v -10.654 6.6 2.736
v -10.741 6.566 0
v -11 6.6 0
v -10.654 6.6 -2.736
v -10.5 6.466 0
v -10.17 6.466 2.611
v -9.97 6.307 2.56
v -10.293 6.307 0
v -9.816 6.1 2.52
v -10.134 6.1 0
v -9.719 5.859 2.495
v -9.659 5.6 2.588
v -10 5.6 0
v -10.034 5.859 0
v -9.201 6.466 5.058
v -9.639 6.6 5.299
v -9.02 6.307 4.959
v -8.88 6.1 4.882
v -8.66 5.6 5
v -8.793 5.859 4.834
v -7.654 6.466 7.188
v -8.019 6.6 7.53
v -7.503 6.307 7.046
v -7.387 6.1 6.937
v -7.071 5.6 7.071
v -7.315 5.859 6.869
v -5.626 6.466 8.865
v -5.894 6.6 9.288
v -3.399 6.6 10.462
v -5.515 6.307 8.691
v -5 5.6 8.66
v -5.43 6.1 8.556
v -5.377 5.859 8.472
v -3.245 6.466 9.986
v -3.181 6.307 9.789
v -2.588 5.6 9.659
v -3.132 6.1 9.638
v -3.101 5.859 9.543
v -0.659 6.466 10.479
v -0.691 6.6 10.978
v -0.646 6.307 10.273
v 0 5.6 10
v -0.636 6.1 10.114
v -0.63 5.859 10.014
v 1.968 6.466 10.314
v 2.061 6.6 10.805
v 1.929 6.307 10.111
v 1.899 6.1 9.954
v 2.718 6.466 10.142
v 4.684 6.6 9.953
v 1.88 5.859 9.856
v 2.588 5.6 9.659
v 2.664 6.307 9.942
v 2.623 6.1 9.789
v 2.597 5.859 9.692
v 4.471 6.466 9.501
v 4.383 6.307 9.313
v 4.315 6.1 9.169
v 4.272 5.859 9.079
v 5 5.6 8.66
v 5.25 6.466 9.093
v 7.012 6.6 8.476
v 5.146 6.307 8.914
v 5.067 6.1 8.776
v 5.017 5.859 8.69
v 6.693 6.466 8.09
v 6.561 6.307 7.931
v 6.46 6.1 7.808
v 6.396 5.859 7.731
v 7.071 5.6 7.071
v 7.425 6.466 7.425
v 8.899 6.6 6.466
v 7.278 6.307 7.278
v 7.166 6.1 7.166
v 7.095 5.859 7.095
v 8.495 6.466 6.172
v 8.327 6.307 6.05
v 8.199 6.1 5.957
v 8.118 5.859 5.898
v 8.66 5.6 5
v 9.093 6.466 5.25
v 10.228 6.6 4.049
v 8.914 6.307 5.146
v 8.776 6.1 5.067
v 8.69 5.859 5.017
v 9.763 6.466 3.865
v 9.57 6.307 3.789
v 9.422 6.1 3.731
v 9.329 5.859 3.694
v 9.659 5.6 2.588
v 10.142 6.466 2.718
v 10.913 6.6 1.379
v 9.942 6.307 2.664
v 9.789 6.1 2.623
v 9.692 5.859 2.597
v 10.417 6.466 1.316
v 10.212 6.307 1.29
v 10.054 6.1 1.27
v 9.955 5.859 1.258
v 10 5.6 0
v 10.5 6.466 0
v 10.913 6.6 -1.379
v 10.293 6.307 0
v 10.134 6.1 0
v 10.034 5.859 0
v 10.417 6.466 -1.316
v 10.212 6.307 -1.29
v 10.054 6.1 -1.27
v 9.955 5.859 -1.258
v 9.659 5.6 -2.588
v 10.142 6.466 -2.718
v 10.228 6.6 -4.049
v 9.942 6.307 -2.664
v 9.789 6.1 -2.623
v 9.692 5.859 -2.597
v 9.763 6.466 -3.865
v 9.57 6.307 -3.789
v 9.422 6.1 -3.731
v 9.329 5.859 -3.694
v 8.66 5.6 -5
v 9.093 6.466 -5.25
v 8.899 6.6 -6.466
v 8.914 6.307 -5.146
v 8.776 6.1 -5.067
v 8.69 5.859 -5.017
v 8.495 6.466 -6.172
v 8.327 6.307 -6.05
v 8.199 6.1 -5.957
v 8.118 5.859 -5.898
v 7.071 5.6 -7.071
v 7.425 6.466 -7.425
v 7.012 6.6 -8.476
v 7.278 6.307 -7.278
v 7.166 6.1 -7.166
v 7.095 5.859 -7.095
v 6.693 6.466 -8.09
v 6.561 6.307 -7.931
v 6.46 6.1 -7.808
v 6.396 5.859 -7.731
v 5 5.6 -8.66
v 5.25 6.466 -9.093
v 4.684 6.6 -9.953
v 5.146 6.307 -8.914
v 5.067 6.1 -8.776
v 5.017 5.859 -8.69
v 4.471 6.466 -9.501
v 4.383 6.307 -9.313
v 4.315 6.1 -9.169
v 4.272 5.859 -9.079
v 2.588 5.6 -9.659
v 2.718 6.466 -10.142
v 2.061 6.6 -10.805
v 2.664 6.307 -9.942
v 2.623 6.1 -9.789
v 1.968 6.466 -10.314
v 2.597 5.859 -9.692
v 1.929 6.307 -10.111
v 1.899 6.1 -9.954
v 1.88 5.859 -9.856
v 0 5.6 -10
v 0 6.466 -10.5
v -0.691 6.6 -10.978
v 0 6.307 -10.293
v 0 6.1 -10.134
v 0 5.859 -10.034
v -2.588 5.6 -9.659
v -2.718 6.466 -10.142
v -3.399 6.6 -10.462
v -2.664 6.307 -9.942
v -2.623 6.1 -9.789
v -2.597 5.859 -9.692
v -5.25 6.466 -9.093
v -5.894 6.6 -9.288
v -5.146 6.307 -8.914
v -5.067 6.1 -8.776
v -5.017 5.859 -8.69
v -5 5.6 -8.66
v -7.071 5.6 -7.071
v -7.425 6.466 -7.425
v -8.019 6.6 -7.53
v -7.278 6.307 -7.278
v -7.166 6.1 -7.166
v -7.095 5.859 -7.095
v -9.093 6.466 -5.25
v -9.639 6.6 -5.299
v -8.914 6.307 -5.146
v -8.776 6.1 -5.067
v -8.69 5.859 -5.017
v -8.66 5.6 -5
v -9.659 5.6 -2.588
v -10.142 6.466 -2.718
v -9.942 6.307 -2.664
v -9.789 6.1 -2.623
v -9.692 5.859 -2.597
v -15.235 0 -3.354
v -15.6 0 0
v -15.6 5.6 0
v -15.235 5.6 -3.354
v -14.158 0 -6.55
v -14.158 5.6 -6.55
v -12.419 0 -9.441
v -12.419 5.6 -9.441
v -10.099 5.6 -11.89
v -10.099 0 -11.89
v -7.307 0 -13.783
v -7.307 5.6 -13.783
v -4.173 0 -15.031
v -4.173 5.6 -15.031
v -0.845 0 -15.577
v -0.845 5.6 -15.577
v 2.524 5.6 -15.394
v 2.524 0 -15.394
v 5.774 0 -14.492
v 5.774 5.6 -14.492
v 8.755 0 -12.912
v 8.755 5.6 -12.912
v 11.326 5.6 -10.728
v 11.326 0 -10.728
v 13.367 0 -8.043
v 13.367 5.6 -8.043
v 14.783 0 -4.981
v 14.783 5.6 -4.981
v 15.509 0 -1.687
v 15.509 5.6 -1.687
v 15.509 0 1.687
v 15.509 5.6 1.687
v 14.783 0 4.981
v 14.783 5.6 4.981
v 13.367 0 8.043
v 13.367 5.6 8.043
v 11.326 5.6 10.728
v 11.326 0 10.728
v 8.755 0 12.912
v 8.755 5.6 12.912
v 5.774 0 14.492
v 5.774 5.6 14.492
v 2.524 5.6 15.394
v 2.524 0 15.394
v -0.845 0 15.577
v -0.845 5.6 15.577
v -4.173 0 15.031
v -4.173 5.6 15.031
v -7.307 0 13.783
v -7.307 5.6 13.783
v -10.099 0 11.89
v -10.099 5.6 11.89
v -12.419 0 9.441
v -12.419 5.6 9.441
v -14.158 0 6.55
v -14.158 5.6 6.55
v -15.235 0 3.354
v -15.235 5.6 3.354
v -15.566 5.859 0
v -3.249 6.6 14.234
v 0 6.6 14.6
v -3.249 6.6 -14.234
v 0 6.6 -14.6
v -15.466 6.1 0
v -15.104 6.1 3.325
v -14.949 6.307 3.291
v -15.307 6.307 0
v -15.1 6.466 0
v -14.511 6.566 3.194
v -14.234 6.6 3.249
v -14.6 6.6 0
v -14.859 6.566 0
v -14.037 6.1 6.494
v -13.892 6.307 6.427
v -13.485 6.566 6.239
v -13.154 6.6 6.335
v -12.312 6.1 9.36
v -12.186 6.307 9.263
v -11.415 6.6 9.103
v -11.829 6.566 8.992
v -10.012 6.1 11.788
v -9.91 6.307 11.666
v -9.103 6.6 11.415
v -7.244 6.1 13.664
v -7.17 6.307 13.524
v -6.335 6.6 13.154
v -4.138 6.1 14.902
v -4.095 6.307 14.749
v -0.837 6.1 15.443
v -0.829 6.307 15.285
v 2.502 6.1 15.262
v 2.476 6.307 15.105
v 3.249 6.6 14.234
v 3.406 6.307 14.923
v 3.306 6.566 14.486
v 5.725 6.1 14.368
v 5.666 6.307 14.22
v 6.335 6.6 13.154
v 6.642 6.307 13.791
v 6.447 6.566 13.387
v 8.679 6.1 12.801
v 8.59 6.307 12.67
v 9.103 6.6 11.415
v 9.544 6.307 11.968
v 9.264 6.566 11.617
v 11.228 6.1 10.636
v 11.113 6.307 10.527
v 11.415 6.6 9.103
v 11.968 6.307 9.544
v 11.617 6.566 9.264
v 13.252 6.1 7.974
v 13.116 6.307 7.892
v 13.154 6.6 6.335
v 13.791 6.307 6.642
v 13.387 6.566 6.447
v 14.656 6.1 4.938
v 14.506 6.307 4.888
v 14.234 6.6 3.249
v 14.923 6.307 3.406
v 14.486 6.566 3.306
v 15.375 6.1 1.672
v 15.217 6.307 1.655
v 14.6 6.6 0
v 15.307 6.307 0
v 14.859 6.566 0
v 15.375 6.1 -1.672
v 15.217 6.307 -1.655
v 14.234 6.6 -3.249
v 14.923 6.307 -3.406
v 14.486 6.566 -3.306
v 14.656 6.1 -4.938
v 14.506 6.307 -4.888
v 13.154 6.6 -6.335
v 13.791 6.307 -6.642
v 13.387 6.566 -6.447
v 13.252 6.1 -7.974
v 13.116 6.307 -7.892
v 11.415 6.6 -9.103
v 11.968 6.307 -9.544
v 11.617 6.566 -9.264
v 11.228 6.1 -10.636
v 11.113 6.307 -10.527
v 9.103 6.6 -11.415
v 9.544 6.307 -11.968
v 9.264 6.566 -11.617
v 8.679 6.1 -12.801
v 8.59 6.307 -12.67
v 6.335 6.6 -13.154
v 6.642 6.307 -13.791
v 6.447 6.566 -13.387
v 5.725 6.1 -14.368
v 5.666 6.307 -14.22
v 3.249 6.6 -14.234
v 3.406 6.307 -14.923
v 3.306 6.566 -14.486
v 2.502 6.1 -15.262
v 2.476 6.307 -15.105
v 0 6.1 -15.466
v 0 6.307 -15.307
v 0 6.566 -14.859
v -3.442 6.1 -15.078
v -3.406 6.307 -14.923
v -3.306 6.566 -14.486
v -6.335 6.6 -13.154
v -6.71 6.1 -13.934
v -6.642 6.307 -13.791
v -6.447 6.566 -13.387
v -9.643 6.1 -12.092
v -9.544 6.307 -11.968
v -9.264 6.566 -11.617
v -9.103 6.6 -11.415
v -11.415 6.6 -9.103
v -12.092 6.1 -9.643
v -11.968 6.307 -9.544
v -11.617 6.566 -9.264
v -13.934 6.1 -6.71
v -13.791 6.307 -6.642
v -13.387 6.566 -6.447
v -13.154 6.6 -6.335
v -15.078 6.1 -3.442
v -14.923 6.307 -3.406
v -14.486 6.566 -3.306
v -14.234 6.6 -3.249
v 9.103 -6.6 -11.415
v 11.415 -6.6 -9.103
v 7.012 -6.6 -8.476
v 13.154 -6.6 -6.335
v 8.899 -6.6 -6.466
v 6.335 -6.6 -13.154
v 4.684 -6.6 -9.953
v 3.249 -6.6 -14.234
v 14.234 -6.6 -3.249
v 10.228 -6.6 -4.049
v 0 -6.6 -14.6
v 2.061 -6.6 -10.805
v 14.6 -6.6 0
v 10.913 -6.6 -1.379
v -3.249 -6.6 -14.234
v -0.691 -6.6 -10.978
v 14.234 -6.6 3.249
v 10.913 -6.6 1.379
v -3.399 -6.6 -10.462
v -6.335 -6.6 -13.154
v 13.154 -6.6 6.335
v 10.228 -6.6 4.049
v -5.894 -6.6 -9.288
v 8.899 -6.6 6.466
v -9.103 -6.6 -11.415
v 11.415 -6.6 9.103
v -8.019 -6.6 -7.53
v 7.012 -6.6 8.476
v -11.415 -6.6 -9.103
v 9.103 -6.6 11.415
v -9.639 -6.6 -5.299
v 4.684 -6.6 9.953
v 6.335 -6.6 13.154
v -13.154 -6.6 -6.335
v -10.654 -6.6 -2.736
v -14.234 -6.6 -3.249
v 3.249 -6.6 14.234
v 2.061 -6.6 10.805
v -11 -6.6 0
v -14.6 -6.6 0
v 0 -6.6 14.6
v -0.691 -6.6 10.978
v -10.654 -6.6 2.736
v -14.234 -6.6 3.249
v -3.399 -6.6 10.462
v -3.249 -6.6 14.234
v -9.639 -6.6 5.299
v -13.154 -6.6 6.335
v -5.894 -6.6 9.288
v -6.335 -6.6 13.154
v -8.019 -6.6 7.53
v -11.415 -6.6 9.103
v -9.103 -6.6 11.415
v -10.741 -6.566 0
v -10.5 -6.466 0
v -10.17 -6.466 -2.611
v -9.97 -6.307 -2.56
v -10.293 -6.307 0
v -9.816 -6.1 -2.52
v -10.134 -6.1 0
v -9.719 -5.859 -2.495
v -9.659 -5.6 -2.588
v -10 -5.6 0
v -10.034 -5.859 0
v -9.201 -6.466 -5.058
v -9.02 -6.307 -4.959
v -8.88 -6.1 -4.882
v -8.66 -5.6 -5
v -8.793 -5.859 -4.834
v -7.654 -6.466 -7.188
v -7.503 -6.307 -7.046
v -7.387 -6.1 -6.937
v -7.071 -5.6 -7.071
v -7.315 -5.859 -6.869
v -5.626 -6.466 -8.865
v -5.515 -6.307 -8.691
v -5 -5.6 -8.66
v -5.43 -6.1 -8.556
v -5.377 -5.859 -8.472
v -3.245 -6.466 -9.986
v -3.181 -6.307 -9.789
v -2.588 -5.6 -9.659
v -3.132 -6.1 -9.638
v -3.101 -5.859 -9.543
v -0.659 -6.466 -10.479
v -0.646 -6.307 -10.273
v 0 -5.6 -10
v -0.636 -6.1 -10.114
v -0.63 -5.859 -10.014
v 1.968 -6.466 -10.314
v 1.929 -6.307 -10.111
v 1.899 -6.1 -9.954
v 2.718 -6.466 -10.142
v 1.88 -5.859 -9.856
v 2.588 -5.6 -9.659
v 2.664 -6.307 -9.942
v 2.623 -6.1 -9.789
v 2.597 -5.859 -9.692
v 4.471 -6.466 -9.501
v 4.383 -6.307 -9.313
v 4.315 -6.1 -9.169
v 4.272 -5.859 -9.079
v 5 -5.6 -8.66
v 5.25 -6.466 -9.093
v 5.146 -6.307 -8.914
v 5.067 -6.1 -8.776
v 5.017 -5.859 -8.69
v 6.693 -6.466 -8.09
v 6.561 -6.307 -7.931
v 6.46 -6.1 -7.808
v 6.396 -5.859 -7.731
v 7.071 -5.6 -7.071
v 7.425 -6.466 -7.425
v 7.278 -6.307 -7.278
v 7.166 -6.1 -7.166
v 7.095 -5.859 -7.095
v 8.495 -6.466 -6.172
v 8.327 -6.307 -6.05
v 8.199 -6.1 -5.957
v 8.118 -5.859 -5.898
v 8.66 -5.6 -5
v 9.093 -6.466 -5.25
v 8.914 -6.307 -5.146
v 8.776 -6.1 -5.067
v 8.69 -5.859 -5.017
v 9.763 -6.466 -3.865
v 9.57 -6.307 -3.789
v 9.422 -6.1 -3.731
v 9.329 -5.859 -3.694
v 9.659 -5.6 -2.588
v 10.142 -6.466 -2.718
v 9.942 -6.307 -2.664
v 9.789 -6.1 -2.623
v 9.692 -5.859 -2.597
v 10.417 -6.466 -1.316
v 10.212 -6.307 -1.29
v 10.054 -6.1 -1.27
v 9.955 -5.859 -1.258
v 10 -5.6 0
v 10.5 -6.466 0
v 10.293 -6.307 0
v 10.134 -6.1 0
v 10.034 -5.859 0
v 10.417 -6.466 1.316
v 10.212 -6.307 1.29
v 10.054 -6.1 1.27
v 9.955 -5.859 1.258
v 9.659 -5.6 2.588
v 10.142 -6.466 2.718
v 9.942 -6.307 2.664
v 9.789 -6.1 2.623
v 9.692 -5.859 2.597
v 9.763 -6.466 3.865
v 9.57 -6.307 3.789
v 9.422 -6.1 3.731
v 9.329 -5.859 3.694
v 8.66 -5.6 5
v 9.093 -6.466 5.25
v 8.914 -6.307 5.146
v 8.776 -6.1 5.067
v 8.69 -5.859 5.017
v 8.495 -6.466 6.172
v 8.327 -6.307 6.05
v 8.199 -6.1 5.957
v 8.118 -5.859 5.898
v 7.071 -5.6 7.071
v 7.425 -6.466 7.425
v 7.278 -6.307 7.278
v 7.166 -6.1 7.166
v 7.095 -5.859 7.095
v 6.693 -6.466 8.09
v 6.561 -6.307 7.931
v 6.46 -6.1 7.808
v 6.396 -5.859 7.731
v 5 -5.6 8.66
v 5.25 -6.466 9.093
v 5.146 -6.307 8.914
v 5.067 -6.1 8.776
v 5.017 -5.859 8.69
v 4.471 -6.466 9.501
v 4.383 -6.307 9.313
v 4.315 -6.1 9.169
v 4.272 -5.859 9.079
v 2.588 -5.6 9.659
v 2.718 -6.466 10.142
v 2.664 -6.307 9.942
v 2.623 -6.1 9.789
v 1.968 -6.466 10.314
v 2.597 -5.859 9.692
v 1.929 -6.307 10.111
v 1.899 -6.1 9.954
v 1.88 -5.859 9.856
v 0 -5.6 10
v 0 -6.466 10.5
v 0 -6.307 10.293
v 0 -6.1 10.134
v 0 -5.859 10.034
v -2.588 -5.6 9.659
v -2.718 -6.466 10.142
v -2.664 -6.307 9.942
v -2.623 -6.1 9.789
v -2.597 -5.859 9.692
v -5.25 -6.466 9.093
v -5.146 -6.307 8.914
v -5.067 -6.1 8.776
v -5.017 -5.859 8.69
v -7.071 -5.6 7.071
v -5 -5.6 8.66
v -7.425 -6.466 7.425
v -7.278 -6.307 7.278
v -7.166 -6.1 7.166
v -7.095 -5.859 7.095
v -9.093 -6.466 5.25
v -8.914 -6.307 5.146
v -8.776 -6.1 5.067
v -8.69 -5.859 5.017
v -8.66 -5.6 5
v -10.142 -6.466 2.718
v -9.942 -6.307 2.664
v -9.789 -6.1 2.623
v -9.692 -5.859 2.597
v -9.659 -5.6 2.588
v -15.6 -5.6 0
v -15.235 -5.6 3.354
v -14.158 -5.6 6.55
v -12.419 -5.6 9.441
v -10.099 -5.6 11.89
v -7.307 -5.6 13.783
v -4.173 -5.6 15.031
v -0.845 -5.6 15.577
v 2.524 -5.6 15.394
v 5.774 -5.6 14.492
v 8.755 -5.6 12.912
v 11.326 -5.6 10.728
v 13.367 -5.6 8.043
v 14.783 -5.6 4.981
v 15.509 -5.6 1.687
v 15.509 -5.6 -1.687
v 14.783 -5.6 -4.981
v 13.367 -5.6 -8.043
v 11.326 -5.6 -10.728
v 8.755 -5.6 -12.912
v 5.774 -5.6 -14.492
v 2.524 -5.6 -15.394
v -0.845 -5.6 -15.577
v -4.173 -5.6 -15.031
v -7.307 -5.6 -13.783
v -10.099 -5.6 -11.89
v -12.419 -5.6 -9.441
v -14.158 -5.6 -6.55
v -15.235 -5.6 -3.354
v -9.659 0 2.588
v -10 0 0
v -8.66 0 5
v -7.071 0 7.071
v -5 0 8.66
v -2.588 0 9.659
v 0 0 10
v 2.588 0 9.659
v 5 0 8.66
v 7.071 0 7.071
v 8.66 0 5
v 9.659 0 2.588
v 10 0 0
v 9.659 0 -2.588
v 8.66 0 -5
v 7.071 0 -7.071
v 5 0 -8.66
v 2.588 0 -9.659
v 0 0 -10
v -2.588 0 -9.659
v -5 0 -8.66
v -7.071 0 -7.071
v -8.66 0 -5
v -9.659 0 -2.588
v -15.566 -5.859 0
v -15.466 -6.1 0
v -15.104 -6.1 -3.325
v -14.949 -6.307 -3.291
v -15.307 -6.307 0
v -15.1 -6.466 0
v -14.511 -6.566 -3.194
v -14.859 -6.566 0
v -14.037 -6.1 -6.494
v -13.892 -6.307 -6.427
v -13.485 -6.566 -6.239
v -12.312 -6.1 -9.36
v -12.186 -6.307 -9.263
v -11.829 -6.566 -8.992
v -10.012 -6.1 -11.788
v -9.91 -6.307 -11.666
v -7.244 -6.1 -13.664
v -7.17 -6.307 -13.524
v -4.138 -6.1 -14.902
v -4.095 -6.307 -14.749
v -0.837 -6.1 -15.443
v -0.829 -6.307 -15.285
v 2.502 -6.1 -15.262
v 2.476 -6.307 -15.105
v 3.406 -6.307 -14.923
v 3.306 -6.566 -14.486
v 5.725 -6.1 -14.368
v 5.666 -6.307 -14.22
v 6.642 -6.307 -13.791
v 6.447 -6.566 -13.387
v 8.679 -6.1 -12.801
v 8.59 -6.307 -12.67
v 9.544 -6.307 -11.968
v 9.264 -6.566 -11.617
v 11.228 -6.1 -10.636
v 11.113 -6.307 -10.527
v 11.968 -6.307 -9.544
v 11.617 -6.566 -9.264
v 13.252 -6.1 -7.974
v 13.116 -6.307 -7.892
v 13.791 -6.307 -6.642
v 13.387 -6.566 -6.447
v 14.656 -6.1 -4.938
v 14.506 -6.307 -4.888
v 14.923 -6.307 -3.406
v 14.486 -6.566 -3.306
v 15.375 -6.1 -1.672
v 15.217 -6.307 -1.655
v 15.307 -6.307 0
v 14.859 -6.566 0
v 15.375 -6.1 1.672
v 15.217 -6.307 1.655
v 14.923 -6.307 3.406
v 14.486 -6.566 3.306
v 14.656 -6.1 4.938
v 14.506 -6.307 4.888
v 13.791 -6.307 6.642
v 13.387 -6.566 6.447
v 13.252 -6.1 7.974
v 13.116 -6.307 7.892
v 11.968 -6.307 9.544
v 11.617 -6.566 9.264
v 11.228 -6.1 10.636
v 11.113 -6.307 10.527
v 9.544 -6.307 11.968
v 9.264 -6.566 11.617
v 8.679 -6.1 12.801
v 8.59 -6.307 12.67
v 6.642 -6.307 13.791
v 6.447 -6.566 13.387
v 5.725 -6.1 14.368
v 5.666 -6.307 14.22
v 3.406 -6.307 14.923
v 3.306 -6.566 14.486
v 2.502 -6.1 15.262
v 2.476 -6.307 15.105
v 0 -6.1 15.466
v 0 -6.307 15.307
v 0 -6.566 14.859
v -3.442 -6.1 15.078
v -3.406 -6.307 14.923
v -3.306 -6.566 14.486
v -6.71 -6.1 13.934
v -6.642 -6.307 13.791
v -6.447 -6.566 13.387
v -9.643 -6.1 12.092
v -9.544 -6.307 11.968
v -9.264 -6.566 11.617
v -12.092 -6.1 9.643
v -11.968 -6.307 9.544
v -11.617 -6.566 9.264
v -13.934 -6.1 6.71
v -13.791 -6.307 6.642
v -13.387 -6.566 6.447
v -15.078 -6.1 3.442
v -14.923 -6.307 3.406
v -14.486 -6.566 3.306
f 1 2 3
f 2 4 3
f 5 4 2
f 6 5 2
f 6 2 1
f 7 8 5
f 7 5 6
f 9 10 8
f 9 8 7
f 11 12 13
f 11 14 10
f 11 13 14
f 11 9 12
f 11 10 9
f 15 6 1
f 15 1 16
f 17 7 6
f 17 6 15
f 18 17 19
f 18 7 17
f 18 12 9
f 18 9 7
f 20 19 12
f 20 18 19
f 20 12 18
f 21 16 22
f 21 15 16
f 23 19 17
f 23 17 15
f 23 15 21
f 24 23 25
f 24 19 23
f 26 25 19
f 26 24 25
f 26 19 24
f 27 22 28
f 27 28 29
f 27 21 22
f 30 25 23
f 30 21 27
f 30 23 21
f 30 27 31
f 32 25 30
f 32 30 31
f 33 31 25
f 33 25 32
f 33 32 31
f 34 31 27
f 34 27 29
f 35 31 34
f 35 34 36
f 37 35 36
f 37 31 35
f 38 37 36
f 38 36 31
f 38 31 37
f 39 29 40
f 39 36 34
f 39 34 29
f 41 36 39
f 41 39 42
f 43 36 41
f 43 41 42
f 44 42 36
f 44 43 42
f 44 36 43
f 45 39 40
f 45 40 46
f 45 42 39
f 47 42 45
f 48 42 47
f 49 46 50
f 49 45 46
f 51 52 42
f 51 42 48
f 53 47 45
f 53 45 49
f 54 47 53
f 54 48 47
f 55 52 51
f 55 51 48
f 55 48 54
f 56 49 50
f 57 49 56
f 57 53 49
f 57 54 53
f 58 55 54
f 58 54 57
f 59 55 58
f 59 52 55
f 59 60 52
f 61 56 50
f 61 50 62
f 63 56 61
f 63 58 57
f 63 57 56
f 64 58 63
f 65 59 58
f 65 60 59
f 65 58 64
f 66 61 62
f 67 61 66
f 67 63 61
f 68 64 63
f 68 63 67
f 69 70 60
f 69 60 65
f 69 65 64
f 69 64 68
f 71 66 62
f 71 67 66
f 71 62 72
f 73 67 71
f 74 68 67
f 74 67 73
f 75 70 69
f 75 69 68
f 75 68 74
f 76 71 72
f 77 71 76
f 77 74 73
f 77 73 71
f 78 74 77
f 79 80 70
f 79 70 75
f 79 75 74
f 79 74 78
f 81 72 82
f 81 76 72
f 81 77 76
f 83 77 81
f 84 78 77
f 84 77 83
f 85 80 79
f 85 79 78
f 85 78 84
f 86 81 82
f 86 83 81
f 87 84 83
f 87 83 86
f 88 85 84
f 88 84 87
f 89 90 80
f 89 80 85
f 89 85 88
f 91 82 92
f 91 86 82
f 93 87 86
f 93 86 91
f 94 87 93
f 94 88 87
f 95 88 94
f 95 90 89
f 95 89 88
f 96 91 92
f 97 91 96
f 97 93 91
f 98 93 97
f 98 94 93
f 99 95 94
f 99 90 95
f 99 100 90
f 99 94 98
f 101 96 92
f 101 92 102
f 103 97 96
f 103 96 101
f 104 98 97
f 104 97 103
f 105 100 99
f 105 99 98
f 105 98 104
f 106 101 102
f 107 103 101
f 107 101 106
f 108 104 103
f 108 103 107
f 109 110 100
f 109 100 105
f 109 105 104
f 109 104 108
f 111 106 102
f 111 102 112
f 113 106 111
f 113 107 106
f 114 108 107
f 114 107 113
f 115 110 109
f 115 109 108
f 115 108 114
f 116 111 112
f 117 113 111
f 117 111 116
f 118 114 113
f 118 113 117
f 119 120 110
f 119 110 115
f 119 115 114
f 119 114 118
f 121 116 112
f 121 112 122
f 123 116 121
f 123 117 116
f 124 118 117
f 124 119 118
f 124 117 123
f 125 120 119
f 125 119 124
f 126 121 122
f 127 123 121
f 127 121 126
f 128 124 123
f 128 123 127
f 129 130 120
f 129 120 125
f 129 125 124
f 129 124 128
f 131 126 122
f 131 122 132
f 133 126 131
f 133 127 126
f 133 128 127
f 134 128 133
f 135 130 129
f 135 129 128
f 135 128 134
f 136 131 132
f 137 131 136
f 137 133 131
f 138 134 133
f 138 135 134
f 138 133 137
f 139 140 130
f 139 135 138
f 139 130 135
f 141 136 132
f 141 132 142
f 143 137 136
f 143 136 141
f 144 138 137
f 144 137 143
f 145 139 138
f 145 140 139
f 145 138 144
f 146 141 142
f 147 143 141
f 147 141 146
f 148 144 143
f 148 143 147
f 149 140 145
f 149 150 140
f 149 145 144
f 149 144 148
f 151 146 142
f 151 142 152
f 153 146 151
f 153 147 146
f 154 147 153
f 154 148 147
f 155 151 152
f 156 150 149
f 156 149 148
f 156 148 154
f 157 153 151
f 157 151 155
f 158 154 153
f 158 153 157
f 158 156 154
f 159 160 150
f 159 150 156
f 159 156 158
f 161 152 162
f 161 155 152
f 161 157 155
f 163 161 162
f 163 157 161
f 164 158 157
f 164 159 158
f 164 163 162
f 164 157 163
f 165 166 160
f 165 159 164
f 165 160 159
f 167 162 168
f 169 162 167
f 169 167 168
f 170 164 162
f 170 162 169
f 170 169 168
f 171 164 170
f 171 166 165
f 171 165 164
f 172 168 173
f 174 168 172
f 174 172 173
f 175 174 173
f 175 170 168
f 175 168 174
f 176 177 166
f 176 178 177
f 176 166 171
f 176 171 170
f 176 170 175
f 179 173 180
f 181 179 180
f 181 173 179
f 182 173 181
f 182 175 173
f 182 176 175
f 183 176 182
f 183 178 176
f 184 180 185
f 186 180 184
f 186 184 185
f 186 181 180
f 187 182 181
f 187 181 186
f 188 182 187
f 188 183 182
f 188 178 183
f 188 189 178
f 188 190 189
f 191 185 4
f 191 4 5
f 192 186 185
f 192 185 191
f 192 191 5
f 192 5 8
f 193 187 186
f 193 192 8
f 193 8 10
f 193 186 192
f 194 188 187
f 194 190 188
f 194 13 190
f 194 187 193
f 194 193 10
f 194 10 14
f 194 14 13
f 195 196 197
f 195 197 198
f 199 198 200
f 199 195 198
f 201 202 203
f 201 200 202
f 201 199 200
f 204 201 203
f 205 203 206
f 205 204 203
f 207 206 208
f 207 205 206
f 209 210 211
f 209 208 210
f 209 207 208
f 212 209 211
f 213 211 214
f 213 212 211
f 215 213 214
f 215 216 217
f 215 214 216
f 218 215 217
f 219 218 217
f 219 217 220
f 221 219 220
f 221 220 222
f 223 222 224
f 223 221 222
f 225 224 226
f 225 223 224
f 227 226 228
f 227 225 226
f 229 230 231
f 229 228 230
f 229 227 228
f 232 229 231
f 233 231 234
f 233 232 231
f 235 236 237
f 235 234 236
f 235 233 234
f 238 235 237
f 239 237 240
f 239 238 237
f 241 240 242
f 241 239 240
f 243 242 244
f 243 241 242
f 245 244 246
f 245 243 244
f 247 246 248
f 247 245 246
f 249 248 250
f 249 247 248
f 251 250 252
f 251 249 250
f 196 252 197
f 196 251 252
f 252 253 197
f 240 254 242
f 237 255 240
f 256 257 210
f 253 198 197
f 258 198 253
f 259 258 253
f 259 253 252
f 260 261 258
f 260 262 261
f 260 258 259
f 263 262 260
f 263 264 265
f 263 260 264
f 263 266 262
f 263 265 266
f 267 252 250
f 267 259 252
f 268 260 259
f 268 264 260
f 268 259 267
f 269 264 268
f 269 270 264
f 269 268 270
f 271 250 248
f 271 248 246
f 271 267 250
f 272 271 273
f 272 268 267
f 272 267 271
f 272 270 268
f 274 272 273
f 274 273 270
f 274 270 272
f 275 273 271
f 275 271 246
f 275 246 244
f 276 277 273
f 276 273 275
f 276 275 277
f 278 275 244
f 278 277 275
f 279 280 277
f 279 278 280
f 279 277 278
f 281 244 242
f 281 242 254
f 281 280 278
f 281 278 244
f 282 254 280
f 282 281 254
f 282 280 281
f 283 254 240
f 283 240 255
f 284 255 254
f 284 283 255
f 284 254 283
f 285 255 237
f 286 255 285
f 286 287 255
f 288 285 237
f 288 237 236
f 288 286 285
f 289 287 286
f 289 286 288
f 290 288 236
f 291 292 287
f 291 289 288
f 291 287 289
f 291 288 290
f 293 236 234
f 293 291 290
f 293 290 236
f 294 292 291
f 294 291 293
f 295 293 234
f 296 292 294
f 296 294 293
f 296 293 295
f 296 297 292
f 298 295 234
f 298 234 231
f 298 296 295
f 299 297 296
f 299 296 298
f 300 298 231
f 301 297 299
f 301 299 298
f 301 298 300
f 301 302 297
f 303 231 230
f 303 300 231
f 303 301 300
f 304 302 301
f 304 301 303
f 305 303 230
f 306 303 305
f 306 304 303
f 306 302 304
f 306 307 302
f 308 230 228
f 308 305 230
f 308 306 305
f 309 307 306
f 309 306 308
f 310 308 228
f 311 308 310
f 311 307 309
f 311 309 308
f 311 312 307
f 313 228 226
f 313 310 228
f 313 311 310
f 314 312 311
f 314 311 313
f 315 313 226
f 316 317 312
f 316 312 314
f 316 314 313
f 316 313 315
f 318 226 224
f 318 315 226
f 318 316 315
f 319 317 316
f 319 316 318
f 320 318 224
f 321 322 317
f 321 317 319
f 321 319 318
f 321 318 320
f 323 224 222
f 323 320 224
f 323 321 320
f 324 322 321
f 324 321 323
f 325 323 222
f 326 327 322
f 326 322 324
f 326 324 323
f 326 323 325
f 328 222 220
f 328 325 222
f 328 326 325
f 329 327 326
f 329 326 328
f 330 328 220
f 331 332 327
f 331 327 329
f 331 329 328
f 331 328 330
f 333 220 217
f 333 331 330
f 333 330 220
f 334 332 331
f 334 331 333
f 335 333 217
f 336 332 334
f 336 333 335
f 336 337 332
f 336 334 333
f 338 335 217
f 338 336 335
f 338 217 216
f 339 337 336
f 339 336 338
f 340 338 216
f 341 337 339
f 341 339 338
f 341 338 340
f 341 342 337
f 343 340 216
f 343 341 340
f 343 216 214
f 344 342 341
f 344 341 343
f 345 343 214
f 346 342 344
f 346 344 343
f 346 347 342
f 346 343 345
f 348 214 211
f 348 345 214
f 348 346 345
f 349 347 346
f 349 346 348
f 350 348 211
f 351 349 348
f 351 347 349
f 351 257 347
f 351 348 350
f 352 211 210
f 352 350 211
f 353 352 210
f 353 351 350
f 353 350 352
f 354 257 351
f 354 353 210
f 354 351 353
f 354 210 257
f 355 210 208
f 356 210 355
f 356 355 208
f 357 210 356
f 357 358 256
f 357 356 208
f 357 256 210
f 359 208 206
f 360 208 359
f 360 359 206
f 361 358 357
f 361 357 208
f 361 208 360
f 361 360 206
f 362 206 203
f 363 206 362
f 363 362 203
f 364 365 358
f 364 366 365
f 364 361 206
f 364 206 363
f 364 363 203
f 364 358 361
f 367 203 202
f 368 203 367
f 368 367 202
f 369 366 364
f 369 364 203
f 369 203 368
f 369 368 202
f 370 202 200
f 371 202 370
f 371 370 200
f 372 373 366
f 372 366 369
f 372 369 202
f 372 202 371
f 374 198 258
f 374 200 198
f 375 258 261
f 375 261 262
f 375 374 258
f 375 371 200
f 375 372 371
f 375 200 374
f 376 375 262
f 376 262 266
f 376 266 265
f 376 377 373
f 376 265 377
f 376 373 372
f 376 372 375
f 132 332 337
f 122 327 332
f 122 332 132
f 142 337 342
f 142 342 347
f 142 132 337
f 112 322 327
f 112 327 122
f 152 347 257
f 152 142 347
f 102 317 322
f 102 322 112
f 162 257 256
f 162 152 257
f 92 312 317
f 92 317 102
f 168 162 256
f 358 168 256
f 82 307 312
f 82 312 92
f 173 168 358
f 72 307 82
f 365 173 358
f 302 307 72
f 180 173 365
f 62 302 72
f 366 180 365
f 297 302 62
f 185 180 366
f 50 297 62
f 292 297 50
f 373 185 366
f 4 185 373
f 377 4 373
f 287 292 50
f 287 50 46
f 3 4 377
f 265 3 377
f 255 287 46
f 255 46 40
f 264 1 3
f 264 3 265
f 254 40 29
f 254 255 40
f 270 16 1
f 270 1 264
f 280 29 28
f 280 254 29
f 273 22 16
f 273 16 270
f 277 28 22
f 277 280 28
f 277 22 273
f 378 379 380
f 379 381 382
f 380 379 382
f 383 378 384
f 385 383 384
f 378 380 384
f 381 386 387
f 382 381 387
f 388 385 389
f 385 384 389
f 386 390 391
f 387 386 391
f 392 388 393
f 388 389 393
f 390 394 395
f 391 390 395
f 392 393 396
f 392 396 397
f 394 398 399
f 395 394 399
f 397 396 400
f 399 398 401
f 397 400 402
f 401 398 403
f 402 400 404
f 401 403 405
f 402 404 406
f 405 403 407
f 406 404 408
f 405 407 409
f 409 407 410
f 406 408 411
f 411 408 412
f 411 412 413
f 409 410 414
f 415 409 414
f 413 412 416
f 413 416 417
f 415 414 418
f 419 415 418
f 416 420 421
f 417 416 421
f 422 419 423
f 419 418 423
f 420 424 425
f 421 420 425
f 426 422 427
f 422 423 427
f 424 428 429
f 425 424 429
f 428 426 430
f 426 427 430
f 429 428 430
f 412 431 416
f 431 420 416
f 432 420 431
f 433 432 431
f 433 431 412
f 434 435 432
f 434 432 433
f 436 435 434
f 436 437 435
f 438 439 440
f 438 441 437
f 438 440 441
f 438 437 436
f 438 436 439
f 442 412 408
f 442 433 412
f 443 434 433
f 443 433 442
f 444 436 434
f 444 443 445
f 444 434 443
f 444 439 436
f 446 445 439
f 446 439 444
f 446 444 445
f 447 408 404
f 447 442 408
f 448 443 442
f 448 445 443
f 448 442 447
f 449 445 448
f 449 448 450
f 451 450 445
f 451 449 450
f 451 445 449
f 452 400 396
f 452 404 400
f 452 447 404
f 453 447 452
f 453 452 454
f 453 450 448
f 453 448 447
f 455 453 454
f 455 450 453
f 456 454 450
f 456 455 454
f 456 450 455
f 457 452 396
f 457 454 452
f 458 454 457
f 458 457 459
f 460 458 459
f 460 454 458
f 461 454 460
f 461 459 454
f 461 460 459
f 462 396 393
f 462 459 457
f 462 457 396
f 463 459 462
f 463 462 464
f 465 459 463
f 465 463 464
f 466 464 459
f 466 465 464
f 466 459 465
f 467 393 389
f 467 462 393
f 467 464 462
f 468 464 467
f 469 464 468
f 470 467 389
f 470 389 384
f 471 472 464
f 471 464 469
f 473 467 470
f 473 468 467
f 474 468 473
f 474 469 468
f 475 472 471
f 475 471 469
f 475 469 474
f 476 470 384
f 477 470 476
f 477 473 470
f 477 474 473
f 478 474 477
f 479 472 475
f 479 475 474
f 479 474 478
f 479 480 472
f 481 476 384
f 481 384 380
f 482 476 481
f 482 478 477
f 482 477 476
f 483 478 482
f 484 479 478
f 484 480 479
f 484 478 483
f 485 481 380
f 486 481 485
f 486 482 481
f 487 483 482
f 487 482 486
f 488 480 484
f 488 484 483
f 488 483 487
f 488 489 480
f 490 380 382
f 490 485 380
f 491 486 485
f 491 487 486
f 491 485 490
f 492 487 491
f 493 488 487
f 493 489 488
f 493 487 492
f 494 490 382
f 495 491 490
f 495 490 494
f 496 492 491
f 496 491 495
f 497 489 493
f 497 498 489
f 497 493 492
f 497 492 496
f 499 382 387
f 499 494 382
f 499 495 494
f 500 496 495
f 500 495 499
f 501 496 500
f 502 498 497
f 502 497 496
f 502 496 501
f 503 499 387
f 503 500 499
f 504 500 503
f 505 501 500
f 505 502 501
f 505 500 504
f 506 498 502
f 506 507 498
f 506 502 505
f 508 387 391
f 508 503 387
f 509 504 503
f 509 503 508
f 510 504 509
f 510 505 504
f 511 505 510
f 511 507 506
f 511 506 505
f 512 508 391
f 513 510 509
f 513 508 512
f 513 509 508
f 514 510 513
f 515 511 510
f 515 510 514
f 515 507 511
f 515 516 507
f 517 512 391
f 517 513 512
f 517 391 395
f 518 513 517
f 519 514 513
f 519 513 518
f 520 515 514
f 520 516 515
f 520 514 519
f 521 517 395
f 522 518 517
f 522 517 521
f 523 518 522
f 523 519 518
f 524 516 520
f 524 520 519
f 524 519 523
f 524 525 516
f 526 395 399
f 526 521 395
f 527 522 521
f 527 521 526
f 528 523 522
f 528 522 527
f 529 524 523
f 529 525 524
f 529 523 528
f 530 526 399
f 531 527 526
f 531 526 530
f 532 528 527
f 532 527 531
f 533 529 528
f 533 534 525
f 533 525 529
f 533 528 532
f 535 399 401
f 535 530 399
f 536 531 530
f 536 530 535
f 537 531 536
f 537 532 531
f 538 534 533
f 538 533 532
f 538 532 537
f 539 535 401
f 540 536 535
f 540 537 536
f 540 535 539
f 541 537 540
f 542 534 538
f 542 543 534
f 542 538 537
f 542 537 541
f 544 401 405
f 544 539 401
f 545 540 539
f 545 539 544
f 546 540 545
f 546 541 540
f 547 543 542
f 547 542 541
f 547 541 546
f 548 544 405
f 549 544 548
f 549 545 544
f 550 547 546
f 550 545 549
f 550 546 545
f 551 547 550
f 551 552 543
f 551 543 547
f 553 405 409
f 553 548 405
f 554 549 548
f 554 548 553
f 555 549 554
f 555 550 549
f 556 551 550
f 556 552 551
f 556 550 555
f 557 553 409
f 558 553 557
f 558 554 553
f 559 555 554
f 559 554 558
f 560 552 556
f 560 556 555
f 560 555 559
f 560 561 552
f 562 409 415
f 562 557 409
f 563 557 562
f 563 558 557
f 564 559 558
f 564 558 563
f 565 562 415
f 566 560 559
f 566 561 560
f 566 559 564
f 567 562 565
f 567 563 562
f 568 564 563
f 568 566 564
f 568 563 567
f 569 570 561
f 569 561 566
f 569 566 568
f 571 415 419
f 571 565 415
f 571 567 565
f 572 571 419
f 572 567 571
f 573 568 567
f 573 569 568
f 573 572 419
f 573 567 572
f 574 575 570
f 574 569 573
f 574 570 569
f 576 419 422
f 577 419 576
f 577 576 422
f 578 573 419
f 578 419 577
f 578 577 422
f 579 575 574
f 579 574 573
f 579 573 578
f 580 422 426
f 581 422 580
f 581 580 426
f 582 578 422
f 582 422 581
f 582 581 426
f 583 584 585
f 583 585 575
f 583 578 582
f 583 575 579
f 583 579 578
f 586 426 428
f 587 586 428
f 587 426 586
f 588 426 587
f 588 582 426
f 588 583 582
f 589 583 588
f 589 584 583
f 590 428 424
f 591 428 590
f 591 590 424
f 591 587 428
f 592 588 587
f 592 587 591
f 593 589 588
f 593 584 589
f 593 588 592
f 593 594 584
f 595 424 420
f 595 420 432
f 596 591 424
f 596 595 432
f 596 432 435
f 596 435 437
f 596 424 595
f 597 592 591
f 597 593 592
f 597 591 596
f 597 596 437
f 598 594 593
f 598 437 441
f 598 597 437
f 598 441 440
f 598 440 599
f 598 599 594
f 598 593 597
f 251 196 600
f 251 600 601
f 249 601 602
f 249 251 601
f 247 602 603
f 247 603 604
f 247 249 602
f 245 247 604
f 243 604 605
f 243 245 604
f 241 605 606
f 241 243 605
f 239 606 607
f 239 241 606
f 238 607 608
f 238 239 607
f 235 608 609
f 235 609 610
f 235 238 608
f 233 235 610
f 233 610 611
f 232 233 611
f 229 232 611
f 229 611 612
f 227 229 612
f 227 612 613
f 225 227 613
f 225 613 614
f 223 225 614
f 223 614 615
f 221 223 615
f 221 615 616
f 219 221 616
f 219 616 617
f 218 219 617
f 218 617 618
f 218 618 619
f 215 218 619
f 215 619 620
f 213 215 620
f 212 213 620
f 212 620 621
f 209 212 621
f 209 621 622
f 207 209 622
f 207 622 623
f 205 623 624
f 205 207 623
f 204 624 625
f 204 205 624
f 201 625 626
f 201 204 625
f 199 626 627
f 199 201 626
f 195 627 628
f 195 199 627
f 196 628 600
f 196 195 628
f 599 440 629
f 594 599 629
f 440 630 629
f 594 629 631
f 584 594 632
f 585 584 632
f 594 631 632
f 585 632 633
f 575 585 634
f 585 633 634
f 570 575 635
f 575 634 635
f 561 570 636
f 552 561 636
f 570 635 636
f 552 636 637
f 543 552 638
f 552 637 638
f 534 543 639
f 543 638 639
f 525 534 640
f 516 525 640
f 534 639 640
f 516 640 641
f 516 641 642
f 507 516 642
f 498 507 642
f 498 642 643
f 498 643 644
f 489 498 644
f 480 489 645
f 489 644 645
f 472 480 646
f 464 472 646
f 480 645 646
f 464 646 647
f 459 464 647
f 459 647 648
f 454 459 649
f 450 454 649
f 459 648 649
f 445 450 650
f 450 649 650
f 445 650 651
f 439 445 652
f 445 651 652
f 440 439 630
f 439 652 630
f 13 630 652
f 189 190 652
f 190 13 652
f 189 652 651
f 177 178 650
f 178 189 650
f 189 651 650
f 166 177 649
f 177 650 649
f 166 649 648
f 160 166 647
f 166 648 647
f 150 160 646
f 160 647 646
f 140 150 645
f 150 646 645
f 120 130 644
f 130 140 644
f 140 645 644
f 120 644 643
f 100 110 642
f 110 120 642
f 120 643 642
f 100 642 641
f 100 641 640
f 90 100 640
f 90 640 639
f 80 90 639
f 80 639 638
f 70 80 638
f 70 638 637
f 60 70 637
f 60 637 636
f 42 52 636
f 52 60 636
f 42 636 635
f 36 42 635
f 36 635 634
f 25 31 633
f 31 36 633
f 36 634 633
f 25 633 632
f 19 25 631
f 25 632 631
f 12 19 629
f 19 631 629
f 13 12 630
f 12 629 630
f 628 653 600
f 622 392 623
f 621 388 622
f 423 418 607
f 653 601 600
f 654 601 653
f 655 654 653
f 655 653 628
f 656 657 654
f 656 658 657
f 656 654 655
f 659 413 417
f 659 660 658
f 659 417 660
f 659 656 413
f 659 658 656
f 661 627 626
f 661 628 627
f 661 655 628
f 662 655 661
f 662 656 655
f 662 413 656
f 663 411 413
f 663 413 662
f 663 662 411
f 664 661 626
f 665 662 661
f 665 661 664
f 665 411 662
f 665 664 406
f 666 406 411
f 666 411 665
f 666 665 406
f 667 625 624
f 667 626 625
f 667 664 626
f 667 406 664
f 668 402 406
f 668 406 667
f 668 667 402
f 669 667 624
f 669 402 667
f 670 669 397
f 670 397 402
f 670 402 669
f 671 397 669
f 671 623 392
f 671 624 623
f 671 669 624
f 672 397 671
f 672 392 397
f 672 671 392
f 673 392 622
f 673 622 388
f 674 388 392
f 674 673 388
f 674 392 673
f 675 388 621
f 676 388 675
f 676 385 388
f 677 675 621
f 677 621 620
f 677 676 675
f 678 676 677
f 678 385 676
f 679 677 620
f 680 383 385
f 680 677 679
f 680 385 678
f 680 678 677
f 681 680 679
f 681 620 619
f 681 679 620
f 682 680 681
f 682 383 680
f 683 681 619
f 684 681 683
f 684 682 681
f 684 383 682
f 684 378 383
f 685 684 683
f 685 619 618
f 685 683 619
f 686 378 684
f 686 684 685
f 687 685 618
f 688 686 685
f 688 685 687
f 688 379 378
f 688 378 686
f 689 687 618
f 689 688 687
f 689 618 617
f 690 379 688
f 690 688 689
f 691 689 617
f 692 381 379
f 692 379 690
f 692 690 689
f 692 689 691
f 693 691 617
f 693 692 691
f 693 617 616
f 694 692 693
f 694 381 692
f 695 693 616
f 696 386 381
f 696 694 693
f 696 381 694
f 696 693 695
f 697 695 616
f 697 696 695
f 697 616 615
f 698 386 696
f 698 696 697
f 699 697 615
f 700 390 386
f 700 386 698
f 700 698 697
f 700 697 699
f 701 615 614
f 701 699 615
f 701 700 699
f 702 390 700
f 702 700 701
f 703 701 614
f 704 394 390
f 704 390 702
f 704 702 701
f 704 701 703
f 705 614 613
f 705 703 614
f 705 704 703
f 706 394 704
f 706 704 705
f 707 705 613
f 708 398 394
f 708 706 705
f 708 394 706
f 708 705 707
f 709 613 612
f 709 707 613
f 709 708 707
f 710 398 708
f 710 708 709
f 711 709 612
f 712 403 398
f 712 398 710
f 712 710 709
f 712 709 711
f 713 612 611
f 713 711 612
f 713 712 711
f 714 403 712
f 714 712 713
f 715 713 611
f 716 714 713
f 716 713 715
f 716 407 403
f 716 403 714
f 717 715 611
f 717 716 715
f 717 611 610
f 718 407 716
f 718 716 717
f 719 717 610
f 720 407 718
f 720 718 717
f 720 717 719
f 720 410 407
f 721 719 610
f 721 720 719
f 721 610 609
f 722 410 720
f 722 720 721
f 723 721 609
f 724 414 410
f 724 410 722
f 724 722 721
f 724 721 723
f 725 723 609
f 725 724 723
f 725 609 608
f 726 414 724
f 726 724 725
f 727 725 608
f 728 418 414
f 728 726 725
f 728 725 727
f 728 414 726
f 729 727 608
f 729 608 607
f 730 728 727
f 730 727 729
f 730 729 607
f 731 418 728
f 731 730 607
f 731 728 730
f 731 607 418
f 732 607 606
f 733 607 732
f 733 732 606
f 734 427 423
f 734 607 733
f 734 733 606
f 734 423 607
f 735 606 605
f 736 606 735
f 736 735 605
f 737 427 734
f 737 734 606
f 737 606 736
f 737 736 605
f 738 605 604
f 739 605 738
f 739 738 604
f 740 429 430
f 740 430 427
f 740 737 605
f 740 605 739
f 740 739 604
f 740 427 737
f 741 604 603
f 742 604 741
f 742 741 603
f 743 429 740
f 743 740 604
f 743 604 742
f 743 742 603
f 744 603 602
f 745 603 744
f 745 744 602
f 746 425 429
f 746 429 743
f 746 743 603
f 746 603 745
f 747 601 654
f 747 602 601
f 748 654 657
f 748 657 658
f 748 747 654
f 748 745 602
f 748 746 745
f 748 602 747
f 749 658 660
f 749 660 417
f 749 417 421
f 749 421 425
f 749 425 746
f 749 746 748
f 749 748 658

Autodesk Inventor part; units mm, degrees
ref_plane "YZ Plane" through (0, 0, 0) normal (1, 0, 0) x (0, 1, 0)
ref_plane "XZ Plane" through (0, 0, 0) normal (0, 1, 0) x (-1, 0, 0)
ref_plane "XY Plane" through (0, 0, 0) normal (0, 0, 1) x (1, 0, 0)
sketch "Sketch1" plane through (0, 0, 0) normal (0, 1, 0) x (-1, 0, 0)
  circle A0 centre (0, 0) radius 15.6
  circle A1 centre (0, 0) radius 10
  dimension "d0" = 31.2
  dimension "d1" = 20
extrude "Extrusion1" add sketch "Sketch1" along normal mid plane 13.2
fillet "Fillet1" radius 1 2 edges at (15.6, 6.6, 0) (15.6, -6.6, 0)
fillet "Fillet2" radius 1 2 edges at (10, 6.6, 0) (10, -6.6, 0)
properties part number "Opona"
